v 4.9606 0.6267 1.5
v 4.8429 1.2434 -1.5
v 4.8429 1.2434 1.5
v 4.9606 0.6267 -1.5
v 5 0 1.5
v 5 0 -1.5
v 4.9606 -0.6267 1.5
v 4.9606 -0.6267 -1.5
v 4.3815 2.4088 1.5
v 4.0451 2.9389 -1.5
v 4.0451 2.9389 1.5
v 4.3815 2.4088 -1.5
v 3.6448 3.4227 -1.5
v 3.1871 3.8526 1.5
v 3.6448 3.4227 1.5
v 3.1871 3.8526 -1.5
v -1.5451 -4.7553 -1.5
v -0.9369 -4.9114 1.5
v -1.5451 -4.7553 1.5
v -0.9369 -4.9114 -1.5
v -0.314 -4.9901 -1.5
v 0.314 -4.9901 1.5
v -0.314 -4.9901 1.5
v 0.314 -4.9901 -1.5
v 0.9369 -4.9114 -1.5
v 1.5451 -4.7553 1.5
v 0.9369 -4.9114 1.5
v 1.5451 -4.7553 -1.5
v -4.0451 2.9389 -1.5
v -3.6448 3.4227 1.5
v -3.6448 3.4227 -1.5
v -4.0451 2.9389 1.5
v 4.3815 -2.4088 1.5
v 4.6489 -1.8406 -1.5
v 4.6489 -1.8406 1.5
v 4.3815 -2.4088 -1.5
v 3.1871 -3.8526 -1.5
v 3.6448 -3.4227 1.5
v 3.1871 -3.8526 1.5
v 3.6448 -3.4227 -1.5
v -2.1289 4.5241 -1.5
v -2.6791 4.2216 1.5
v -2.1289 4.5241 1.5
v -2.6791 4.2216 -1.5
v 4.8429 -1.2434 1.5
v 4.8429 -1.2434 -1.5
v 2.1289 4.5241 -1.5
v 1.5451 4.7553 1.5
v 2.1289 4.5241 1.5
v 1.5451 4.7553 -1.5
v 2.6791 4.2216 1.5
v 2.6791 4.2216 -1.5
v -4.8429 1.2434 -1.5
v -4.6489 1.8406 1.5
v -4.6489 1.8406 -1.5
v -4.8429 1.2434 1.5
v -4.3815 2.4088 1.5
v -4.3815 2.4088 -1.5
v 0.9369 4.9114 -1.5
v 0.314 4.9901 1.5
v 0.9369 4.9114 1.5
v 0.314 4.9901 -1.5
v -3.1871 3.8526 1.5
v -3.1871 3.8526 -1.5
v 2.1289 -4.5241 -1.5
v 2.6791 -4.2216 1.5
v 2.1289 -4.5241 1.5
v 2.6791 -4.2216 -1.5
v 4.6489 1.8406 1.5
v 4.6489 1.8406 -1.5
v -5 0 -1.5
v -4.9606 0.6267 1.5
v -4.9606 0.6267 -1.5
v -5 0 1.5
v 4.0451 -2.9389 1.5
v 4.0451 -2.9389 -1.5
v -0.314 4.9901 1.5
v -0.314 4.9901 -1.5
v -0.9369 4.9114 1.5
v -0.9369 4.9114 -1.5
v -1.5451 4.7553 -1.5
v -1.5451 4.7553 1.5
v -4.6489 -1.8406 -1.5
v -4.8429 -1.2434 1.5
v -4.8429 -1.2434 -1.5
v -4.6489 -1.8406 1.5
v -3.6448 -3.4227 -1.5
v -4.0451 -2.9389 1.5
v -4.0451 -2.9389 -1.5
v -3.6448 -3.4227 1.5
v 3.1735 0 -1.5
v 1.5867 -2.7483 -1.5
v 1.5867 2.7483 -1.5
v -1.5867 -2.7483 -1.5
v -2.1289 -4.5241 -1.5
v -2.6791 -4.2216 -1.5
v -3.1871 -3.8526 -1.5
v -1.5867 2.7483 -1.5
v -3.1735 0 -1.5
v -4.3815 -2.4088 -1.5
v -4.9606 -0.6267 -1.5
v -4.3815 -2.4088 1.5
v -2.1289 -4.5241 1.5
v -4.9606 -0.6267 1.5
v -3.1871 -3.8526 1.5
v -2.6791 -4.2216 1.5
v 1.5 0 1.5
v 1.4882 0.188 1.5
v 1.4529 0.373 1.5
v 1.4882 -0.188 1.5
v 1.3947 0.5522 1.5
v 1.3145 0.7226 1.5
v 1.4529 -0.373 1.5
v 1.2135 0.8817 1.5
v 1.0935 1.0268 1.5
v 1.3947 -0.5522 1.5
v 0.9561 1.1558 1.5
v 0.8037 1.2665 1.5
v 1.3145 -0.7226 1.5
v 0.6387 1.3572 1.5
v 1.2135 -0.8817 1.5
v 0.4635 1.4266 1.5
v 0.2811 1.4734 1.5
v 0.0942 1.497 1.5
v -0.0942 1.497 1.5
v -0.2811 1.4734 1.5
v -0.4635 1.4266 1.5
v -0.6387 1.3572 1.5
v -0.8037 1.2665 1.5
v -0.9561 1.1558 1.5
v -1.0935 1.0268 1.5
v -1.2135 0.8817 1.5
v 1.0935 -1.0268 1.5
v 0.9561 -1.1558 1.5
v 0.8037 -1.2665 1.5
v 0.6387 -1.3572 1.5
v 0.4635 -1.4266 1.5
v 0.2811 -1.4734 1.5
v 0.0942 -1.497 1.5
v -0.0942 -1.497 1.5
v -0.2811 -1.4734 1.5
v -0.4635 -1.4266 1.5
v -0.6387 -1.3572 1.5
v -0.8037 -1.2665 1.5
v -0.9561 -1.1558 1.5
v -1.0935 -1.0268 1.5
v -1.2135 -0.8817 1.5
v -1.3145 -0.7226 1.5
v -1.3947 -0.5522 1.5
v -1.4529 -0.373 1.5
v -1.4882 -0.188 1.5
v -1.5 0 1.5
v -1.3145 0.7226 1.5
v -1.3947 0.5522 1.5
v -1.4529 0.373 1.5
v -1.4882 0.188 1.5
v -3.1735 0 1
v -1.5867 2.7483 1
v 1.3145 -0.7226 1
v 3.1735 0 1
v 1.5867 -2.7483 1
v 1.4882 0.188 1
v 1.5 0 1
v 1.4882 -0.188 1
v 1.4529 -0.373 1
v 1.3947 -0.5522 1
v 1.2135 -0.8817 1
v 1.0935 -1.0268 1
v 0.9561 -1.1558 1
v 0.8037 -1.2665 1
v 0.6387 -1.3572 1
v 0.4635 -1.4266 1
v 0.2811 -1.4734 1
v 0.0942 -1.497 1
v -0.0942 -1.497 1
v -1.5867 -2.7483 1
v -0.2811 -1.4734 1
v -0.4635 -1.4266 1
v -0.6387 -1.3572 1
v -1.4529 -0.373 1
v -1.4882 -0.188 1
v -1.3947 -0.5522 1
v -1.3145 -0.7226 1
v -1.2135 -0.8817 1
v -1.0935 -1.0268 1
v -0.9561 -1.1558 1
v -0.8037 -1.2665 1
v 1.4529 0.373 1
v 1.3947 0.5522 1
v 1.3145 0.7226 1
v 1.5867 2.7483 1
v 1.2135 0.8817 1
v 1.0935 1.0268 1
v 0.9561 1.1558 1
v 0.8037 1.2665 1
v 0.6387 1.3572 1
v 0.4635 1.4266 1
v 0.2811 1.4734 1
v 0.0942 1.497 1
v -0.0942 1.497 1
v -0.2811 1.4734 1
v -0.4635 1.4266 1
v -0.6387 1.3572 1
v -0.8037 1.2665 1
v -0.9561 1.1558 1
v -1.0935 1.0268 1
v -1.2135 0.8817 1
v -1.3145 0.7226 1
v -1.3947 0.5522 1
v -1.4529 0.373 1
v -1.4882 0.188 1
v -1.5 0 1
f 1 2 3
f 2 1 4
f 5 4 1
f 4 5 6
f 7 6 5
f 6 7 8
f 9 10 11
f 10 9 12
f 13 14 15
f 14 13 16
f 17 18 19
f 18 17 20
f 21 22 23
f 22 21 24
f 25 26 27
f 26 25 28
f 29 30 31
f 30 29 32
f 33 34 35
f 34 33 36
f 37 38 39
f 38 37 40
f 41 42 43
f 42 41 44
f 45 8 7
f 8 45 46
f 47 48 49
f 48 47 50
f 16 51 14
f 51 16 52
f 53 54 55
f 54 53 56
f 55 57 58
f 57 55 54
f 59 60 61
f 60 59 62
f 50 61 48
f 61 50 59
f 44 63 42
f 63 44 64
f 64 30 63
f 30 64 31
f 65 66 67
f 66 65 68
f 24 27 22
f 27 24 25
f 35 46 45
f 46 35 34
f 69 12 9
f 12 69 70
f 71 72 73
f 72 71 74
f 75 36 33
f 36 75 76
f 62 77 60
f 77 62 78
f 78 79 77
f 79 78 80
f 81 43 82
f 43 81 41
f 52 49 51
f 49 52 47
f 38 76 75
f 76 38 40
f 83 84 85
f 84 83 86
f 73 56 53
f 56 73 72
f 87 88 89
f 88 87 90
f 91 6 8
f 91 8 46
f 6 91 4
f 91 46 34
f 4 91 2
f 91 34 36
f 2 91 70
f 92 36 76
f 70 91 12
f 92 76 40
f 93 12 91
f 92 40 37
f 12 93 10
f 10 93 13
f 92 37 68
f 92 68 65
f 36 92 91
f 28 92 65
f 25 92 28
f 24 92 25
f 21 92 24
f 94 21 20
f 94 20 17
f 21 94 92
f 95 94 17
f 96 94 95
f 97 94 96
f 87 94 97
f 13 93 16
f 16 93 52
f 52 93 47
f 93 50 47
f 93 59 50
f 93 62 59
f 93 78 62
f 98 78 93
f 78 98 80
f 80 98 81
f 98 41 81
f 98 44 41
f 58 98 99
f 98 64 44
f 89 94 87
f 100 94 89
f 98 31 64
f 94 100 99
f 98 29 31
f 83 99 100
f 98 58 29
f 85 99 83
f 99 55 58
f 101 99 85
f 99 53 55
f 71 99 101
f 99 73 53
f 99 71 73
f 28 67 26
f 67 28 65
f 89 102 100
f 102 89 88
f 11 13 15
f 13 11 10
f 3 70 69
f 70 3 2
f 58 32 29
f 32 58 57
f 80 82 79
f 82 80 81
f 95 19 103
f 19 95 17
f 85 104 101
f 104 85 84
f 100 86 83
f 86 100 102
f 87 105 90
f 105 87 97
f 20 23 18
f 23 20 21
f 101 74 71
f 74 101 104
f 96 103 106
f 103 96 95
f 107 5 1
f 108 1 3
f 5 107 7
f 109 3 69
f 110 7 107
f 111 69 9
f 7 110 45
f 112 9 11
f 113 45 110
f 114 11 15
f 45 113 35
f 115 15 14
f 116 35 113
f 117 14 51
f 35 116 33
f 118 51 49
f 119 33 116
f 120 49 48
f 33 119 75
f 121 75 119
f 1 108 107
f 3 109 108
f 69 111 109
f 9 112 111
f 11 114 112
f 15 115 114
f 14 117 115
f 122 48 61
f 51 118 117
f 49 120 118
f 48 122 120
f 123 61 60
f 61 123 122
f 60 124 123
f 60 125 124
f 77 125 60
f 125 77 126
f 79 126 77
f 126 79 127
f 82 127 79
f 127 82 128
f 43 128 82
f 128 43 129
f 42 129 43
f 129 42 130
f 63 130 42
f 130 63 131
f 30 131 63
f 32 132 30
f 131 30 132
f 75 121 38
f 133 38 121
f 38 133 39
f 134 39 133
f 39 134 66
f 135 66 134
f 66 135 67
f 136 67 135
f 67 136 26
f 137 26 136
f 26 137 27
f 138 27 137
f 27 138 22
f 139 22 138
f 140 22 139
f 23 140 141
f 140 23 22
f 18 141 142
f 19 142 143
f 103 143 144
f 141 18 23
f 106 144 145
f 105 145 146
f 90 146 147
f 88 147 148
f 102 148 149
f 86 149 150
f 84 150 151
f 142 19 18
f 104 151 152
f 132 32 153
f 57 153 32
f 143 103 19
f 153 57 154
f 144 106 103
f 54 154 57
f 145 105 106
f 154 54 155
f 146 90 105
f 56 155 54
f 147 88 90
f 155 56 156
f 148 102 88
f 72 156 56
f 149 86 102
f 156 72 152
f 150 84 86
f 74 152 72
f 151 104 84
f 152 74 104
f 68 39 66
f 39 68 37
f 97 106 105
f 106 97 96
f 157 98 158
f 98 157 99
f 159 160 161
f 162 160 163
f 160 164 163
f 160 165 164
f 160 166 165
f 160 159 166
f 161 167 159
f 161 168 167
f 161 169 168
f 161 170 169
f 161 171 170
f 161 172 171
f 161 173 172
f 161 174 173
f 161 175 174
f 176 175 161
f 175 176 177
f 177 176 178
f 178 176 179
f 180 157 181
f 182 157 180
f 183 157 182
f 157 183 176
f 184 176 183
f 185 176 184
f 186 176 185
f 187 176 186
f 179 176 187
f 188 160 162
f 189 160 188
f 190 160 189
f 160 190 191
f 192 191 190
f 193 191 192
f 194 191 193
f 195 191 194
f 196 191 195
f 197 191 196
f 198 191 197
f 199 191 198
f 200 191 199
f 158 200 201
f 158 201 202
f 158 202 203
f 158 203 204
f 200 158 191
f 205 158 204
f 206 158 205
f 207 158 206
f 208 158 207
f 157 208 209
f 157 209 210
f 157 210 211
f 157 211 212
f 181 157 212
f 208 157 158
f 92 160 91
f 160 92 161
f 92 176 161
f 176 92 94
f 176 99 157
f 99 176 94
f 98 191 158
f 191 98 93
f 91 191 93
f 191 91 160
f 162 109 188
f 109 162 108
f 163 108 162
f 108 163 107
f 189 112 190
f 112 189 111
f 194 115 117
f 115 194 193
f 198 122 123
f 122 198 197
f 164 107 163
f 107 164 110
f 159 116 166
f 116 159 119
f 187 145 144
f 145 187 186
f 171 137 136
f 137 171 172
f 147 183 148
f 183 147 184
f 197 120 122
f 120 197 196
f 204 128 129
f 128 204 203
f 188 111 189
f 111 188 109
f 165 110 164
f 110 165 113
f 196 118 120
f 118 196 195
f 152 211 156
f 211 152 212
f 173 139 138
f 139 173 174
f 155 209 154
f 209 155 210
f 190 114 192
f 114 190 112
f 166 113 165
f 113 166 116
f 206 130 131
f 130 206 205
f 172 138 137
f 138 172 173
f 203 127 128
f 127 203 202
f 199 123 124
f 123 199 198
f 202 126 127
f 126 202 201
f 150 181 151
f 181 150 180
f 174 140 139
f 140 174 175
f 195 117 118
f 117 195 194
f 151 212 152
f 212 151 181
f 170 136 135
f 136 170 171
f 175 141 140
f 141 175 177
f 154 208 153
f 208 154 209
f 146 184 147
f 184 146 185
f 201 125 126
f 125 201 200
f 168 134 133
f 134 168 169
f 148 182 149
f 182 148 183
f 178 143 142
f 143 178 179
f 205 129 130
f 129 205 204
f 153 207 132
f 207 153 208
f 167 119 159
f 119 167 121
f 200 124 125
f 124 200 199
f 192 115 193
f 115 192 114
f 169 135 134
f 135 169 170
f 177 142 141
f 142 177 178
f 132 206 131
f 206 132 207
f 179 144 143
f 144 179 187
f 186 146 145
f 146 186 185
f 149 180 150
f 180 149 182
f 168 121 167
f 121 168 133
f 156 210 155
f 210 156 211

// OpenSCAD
$fn = 50;


difference() {
	union() {
		translate(v = [0, 0, -1.5000000000]) {
			cylinder(h = 3, r = 5.0000000000);
		}
		translate(v = [0, 0, -1.5000000000]) {
			cylinder(h = 3, r = 3.0000000000);
		}
	}
	union() {
		translate(v = [0, 0, -1.5000000000]) {
			rotate(a = [0, 0, 0]) {
				difference() {
					union() {
						linear_extrude(height = 2.5000000000) {
							polygon(points = [[3.1735000000, 0.0000000000], [1.5867500000, 2.7483316189], [-1.5867500000, 2.7483316189], [-3.1735000000, 0.0000000000], [-1.5867500000, -2.7483316189], [1.5867500000, -2.7483316189]]);
						}
					}
					union();
				}
			}
		}
		translate(v = [0, 0, -100.0000000000]) {
			cylinder(h = 200, r = 1.5000000000);
		}
	}
}
